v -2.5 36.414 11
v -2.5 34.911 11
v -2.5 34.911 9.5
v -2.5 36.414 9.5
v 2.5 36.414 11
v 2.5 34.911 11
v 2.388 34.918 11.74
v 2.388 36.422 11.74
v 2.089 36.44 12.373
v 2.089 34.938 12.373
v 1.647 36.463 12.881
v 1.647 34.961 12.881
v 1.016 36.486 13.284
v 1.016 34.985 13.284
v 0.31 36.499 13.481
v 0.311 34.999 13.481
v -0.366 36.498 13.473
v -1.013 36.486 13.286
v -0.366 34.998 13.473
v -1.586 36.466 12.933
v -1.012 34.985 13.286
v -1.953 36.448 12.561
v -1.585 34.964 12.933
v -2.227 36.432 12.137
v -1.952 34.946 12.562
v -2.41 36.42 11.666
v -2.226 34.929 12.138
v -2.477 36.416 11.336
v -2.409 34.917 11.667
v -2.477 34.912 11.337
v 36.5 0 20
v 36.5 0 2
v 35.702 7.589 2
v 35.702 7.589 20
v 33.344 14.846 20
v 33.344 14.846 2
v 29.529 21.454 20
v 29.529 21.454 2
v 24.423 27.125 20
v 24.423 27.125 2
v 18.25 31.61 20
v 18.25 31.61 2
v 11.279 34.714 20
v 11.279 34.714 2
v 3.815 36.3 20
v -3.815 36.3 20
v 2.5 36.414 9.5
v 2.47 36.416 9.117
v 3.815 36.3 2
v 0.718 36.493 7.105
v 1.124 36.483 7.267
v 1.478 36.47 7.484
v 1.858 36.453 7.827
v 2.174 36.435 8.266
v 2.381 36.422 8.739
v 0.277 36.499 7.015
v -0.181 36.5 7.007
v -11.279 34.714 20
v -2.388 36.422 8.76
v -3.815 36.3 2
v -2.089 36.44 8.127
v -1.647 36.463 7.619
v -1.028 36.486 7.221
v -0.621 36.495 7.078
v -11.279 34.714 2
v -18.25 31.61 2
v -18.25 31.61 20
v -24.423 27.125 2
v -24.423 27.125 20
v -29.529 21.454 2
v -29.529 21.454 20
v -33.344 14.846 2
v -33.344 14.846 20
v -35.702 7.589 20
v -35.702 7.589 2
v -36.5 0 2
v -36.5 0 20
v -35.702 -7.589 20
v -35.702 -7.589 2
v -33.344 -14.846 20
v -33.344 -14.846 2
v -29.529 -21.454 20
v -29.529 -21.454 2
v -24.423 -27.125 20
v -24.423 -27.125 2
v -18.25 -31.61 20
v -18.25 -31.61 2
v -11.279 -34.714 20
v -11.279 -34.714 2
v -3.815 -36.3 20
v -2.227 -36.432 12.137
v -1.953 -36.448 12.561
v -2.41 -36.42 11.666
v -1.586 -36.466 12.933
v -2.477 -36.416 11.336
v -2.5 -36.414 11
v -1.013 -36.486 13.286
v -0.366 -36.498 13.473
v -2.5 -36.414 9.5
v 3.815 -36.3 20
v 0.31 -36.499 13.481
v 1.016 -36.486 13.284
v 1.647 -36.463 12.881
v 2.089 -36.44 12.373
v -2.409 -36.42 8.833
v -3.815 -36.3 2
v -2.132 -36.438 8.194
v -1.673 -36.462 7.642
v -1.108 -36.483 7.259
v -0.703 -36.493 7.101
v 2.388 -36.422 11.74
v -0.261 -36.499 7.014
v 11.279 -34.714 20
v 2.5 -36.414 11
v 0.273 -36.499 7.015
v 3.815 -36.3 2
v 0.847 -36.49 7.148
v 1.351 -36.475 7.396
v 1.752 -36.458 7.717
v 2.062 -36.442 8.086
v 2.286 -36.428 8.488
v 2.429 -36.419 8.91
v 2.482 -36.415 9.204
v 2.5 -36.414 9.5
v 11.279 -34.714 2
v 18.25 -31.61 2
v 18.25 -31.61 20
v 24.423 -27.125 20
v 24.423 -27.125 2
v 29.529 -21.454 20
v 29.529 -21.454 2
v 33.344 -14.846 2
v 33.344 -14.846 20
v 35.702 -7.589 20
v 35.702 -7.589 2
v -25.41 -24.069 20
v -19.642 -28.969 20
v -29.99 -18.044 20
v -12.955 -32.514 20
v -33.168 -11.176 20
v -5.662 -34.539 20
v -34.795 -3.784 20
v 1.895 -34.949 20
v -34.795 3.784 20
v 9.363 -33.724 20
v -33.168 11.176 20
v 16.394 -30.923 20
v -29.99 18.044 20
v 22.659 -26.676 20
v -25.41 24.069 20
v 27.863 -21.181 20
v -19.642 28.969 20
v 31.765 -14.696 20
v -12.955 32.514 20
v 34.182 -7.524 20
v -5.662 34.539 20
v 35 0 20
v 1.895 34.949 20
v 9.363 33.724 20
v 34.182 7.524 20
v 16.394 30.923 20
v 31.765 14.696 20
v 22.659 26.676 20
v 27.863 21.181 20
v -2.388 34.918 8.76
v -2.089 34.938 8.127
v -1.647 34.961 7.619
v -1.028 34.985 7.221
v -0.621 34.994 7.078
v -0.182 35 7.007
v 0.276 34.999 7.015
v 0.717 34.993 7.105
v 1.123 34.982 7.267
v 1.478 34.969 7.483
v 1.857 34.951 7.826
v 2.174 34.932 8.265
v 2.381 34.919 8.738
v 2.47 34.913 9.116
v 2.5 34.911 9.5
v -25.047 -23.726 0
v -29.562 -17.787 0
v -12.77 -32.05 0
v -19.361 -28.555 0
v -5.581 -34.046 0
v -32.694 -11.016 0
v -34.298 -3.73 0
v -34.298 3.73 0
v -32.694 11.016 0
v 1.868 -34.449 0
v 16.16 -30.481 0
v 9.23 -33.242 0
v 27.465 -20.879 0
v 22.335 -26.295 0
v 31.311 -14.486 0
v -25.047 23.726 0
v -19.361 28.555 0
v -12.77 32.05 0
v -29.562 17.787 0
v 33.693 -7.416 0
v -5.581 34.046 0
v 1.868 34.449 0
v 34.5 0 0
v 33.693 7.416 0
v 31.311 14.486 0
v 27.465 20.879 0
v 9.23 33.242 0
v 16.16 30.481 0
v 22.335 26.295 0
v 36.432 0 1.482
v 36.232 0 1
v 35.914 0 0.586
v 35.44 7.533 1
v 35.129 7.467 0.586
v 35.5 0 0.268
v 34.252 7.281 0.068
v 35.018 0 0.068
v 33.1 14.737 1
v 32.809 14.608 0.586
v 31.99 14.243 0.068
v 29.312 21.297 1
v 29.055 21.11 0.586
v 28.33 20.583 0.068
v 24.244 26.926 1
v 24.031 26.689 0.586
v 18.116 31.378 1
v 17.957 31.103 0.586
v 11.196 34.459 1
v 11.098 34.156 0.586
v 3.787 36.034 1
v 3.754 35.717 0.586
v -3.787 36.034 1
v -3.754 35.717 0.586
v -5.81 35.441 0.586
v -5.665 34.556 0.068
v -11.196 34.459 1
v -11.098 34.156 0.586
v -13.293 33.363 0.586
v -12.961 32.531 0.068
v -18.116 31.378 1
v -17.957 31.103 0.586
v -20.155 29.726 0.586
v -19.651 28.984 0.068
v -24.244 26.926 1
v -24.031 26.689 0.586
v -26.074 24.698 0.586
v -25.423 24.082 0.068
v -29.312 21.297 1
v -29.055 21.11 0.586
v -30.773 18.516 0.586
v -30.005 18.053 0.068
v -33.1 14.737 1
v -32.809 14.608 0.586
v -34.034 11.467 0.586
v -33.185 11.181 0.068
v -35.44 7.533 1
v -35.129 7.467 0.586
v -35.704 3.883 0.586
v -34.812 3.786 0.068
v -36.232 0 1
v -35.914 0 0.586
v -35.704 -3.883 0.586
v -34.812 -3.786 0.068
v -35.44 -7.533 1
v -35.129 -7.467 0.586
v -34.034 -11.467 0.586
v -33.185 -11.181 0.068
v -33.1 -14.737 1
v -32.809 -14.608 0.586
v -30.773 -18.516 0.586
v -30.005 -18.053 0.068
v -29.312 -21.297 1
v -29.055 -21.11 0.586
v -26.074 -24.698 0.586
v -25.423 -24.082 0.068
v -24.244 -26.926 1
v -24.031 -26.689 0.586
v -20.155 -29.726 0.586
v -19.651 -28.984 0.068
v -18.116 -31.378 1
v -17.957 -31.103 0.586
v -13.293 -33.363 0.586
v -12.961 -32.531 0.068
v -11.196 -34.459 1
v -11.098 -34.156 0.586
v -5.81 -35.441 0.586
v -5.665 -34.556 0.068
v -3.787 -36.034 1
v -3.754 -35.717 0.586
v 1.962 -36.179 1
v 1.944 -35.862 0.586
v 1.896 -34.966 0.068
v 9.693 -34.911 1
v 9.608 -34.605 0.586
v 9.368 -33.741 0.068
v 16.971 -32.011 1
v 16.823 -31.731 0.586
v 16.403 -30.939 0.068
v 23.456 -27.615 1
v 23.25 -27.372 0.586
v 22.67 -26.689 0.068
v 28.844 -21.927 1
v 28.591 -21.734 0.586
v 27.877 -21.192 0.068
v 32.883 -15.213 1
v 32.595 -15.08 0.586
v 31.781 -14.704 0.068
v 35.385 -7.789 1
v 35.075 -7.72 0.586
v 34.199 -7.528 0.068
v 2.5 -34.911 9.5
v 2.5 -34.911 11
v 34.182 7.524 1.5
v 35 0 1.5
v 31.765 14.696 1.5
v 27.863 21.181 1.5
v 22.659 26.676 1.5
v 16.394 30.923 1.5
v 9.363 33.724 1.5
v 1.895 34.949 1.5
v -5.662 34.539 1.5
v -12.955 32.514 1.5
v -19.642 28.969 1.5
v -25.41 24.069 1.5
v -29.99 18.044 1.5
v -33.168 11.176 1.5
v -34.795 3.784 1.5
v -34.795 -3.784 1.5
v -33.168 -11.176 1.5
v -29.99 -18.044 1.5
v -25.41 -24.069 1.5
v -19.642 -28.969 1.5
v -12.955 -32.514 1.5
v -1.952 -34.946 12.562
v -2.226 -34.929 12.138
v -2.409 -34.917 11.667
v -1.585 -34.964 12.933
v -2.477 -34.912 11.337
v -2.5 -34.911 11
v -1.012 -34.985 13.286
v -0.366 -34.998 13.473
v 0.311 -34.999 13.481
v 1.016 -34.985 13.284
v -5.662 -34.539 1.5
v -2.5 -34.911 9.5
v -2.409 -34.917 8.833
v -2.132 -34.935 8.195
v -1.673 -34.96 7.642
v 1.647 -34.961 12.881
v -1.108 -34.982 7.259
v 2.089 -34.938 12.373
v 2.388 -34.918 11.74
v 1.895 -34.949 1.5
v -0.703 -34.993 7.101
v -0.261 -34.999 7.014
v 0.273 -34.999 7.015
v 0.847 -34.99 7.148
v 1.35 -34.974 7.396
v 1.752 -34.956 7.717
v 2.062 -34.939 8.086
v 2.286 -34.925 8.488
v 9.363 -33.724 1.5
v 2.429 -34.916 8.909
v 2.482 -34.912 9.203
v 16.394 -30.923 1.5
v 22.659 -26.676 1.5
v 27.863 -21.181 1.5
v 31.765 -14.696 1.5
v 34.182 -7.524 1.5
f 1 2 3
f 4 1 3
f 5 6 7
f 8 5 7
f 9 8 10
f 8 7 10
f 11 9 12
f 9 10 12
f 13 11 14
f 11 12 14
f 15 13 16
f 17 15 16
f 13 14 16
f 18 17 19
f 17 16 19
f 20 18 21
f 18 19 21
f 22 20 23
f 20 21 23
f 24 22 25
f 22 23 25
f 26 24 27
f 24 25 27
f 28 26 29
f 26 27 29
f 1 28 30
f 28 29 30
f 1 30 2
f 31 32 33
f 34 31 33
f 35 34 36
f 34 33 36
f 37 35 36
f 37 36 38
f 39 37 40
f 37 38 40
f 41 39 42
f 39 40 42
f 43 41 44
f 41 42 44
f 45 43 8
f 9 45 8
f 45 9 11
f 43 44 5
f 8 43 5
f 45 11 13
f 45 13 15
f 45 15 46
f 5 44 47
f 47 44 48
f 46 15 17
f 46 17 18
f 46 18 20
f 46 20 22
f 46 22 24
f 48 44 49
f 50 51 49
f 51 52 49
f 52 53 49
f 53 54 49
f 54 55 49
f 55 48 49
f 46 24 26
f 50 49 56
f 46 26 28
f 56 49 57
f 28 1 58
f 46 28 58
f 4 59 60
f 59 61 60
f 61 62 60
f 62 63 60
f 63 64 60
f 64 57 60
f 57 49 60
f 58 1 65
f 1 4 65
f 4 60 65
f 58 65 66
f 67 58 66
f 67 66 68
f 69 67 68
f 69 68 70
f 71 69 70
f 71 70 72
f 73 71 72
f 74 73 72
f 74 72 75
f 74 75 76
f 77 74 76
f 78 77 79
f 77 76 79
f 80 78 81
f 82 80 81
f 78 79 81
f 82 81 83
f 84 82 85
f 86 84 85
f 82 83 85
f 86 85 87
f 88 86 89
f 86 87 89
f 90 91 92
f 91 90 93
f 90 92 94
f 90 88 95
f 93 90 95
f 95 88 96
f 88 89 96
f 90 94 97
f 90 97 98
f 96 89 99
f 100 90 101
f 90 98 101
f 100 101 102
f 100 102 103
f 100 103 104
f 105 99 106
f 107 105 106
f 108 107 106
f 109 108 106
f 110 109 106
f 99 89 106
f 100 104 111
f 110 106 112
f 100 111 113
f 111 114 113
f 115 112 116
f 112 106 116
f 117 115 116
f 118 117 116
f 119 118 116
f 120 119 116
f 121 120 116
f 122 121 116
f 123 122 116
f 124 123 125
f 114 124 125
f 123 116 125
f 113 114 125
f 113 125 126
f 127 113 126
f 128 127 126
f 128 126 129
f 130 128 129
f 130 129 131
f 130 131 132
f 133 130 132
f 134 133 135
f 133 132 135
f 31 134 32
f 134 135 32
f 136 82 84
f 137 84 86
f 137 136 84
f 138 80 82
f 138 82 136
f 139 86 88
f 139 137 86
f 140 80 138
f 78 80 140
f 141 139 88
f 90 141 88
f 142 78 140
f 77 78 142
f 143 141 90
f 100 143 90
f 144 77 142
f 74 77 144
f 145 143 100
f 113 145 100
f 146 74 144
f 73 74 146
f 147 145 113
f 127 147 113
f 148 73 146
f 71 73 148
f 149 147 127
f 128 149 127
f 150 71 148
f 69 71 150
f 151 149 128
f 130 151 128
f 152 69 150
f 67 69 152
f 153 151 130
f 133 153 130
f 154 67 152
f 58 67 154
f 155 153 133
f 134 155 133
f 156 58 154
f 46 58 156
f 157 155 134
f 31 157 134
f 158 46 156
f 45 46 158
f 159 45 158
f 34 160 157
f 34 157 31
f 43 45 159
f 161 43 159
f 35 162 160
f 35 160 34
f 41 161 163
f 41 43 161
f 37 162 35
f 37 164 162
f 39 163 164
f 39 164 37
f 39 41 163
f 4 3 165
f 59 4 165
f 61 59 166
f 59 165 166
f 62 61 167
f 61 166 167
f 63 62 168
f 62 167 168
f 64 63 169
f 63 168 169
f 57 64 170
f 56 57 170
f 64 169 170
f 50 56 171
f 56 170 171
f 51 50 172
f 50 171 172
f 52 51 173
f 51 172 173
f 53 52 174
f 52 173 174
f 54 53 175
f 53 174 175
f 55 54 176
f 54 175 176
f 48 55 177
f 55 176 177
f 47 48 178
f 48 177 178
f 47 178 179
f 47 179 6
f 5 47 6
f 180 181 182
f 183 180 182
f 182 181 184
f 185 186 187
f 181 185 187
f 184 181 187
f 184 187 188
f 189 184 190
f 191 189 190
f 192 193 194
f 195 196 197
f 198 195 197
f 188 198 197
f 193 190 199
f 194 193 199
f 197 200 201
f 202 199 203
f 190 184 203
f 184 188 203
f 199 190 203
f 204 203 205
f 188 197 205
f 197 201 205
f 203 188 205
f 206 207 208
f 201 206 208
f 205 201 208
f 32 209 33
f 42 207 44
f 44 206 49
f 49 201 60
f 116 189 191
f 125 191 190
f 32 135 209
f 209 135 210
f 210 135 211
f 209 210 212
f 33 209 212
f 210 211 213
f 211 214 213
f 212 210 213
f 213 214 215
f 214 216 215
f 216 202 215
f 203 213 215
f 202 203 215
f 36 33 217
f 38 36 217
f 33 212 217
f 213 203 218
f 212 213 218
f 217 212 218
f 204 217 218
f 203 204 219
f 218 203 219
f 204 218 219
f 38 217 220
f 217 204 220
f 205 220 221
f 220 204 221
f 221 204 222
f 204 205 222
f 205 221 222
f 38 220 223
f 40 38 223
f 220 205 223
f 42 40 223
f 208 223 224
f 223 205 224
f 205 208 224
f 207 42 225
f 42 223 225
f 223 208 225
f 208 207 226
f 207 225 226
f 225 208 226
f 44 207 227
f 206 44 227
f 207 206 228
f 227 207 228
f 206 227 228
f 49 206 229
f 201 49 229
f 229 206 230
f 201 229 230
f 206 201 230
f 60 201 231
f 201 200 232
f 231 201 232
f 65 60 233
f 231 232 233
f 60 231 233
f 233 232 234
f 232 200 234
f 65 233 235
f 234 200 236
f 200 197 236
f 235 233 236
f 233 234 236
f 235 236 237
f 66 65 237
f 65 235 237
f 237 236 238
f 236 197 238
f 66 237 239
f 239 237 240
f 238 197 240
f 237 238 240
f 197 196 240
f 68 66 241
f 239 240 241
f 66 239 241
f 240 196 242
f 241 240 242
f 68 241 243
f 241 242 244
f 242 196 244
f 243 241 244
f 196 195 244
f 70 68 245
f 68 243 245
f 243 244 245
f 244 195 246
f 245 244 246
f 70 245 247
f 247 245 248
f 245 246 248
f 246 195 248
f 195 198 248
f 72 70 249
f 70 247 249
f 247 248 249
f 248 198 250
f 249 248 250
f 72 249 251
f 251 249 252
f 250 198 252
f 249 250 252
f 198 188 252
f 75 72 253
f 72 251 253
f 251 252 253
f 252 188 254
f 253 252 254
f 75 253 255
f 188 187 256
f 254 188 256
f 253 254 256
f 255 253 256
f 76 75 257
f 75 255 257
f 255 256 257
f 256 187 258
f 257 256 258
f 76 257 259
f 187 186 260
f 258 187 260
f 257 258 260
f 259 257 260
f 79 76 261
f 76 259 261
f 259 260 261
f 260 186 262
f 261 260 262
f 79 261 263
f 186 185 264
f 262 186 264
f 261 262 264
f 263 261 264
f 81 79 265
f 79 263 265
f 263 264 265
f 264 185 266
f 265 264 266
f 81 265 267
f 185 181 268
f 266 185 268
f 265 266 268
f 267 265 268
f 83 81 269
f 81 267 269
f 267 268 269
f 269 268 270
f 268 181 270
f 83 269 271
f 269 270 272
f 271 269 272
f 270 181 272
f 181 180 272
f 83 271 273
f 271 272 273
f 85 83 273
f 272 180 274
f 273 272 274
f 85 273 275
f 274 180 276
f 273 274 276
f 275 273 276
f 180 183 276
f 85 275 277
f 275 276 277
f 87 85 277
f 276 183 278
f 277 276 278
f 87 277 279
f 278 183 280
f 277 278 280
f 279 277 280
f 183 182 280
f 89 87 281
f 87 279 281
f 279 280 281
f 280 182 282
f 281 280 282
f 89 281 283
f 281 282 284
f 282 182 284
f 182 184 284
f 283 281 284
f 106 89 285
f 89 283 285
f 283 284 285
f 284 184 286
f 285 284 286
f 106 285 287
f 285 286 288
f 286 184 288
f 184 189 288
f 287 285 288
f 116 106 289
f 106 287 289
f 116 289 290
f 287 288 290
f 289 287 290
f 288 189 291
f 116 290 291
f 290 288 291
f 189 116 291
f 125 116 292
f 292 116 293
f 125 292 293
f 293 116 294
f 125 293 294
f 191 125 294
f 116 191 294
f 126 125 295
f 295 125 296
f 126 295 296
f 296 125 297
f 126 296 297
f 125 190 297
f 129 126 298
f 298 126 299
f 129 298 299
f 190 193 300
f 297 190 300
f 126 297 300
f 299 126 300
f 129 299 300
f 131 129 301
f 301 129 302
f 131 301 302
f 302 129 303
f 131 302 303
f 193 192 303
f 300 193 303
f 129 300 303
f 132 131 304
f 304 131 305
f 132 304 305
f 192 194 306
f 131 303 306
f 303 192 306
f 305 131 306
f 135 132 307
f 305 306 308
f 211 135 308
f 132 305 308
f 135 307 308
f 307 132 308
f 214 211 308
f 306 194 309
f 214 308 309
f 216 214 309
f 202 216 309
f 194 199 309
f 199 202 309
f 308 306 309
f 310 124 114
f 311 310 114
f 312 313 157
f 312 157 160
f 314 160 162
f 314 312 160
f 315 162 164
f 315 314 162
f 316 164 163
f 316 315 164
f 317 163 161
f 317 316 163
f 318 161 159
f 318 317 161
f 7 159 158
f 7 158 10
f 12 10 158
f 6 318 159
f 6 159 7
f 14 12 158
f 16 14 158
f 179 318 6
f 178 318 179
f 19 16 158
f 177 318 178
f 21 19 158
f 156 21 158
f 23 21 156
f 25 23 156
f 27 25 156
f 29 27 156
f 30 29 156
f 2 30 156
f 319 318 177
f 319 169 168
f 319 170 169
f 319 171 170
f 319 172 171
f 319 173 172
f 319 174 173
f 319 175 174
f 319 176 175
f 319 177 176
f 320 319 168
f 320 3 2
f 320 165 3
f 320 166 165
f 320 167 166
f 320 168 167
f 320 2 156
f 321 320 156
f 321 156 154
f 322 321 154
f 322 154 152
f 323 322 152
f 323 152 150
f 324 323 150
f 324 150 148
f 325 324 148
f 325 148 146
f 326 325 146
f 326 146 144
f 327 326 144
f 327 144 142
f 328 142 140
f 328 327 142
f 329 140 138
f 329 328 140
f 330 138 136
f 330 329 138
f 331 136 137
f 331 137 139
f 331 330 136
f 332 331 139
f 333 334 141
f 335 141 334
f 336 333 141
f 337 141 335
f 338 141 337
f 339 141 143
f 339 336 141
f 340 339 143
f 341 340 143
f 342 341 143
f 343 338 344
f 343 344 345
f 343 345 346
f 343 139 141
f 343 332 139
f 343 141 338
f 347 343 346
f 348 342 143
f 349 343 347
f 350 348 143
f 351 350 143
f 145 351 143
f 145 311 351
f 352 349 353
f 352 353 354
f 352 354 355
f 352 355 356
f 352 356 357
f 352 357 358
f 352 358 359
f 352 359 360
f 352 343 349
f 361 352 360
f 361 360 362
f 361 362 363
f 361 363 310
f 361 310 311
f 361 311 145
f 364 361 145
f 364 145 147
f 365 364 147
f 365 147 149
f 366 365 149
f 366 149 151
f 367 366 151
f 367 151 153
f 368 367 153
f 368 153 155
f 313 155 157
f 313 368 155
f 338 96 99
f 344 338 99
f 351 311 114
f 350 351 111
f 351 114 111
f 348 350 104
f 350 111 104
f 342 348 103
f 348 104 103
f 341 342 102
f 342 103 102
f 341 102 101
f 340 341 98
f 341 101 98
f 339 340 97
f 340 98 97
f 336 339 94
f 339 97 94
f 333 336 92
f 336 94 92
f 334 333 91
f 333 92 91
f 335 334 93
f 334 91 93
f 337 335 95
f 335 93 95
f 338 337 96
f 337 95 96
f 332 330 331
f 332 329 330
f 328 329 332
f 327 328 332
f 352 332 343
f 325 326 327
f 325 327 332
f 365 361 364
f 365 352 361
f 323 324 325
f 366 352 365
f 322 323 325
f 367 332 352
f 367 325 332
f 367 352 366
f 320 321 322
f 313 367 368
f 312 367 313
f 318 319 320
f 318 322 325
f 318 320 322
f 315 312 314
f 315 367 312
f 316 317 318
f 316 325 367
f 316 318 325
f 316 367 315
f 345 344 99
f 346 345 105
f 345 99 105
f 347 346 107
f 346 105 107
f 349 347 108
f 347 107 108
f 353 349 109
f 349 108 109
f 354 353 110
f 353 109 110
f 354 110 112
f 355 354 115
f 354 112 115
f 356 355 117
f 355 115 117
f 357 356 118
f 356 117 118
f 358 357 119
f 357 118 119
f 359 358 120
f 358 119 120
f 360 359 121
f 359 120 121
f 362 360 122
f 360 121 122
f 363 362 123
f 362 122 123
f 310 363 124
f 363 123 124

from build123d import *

# Parameters (mm, degrees)
F0_R     = 36.5
F1_DEPTH = 20
F2_T     = -1.5
F3_R     = 2
F5_DEPTH = 50


with BuildPart() as f1:
    # F0 (on Top) → F1 (new body)
    with BuildSketch(Plane.XY):
        Circle(F0_R)
    extrude(amount=F1_DEPTH)

    # F2
    f2_openings = [f1.faces().sort_by_distance(p)[0] for p in [
        (0, 0, 20),
    ]]
    offset(amount=F2_T, openings=f2_openings)

    # F3
    f3_edges = [f1.edges().sort_by_distance(p)[0] for p in [
        (-36.5, 0, 0),
    ]]
    fillet(f3_edges, radius=F3_R)

    # F4 (on Front) → F5 (cut, symmetric)
    with BuildSketch(Plane.XZ):
        with BuildLine():
            Line((-2.5, 11), (-2.5, 9.5))
            ThreePointArc((-2.5, 9.5), (0, 7), (2.5, 9.5))
            Line((2.5, 9.5), (2.5, 11))
            ThreePointArc((2.5, 11), (0, 13.5), (-2.5, 11))
        make_face()
    extrude(amount=F5_DEPTH, both=True, mode=Mode.SUBTRACT)


solid = f1.part
